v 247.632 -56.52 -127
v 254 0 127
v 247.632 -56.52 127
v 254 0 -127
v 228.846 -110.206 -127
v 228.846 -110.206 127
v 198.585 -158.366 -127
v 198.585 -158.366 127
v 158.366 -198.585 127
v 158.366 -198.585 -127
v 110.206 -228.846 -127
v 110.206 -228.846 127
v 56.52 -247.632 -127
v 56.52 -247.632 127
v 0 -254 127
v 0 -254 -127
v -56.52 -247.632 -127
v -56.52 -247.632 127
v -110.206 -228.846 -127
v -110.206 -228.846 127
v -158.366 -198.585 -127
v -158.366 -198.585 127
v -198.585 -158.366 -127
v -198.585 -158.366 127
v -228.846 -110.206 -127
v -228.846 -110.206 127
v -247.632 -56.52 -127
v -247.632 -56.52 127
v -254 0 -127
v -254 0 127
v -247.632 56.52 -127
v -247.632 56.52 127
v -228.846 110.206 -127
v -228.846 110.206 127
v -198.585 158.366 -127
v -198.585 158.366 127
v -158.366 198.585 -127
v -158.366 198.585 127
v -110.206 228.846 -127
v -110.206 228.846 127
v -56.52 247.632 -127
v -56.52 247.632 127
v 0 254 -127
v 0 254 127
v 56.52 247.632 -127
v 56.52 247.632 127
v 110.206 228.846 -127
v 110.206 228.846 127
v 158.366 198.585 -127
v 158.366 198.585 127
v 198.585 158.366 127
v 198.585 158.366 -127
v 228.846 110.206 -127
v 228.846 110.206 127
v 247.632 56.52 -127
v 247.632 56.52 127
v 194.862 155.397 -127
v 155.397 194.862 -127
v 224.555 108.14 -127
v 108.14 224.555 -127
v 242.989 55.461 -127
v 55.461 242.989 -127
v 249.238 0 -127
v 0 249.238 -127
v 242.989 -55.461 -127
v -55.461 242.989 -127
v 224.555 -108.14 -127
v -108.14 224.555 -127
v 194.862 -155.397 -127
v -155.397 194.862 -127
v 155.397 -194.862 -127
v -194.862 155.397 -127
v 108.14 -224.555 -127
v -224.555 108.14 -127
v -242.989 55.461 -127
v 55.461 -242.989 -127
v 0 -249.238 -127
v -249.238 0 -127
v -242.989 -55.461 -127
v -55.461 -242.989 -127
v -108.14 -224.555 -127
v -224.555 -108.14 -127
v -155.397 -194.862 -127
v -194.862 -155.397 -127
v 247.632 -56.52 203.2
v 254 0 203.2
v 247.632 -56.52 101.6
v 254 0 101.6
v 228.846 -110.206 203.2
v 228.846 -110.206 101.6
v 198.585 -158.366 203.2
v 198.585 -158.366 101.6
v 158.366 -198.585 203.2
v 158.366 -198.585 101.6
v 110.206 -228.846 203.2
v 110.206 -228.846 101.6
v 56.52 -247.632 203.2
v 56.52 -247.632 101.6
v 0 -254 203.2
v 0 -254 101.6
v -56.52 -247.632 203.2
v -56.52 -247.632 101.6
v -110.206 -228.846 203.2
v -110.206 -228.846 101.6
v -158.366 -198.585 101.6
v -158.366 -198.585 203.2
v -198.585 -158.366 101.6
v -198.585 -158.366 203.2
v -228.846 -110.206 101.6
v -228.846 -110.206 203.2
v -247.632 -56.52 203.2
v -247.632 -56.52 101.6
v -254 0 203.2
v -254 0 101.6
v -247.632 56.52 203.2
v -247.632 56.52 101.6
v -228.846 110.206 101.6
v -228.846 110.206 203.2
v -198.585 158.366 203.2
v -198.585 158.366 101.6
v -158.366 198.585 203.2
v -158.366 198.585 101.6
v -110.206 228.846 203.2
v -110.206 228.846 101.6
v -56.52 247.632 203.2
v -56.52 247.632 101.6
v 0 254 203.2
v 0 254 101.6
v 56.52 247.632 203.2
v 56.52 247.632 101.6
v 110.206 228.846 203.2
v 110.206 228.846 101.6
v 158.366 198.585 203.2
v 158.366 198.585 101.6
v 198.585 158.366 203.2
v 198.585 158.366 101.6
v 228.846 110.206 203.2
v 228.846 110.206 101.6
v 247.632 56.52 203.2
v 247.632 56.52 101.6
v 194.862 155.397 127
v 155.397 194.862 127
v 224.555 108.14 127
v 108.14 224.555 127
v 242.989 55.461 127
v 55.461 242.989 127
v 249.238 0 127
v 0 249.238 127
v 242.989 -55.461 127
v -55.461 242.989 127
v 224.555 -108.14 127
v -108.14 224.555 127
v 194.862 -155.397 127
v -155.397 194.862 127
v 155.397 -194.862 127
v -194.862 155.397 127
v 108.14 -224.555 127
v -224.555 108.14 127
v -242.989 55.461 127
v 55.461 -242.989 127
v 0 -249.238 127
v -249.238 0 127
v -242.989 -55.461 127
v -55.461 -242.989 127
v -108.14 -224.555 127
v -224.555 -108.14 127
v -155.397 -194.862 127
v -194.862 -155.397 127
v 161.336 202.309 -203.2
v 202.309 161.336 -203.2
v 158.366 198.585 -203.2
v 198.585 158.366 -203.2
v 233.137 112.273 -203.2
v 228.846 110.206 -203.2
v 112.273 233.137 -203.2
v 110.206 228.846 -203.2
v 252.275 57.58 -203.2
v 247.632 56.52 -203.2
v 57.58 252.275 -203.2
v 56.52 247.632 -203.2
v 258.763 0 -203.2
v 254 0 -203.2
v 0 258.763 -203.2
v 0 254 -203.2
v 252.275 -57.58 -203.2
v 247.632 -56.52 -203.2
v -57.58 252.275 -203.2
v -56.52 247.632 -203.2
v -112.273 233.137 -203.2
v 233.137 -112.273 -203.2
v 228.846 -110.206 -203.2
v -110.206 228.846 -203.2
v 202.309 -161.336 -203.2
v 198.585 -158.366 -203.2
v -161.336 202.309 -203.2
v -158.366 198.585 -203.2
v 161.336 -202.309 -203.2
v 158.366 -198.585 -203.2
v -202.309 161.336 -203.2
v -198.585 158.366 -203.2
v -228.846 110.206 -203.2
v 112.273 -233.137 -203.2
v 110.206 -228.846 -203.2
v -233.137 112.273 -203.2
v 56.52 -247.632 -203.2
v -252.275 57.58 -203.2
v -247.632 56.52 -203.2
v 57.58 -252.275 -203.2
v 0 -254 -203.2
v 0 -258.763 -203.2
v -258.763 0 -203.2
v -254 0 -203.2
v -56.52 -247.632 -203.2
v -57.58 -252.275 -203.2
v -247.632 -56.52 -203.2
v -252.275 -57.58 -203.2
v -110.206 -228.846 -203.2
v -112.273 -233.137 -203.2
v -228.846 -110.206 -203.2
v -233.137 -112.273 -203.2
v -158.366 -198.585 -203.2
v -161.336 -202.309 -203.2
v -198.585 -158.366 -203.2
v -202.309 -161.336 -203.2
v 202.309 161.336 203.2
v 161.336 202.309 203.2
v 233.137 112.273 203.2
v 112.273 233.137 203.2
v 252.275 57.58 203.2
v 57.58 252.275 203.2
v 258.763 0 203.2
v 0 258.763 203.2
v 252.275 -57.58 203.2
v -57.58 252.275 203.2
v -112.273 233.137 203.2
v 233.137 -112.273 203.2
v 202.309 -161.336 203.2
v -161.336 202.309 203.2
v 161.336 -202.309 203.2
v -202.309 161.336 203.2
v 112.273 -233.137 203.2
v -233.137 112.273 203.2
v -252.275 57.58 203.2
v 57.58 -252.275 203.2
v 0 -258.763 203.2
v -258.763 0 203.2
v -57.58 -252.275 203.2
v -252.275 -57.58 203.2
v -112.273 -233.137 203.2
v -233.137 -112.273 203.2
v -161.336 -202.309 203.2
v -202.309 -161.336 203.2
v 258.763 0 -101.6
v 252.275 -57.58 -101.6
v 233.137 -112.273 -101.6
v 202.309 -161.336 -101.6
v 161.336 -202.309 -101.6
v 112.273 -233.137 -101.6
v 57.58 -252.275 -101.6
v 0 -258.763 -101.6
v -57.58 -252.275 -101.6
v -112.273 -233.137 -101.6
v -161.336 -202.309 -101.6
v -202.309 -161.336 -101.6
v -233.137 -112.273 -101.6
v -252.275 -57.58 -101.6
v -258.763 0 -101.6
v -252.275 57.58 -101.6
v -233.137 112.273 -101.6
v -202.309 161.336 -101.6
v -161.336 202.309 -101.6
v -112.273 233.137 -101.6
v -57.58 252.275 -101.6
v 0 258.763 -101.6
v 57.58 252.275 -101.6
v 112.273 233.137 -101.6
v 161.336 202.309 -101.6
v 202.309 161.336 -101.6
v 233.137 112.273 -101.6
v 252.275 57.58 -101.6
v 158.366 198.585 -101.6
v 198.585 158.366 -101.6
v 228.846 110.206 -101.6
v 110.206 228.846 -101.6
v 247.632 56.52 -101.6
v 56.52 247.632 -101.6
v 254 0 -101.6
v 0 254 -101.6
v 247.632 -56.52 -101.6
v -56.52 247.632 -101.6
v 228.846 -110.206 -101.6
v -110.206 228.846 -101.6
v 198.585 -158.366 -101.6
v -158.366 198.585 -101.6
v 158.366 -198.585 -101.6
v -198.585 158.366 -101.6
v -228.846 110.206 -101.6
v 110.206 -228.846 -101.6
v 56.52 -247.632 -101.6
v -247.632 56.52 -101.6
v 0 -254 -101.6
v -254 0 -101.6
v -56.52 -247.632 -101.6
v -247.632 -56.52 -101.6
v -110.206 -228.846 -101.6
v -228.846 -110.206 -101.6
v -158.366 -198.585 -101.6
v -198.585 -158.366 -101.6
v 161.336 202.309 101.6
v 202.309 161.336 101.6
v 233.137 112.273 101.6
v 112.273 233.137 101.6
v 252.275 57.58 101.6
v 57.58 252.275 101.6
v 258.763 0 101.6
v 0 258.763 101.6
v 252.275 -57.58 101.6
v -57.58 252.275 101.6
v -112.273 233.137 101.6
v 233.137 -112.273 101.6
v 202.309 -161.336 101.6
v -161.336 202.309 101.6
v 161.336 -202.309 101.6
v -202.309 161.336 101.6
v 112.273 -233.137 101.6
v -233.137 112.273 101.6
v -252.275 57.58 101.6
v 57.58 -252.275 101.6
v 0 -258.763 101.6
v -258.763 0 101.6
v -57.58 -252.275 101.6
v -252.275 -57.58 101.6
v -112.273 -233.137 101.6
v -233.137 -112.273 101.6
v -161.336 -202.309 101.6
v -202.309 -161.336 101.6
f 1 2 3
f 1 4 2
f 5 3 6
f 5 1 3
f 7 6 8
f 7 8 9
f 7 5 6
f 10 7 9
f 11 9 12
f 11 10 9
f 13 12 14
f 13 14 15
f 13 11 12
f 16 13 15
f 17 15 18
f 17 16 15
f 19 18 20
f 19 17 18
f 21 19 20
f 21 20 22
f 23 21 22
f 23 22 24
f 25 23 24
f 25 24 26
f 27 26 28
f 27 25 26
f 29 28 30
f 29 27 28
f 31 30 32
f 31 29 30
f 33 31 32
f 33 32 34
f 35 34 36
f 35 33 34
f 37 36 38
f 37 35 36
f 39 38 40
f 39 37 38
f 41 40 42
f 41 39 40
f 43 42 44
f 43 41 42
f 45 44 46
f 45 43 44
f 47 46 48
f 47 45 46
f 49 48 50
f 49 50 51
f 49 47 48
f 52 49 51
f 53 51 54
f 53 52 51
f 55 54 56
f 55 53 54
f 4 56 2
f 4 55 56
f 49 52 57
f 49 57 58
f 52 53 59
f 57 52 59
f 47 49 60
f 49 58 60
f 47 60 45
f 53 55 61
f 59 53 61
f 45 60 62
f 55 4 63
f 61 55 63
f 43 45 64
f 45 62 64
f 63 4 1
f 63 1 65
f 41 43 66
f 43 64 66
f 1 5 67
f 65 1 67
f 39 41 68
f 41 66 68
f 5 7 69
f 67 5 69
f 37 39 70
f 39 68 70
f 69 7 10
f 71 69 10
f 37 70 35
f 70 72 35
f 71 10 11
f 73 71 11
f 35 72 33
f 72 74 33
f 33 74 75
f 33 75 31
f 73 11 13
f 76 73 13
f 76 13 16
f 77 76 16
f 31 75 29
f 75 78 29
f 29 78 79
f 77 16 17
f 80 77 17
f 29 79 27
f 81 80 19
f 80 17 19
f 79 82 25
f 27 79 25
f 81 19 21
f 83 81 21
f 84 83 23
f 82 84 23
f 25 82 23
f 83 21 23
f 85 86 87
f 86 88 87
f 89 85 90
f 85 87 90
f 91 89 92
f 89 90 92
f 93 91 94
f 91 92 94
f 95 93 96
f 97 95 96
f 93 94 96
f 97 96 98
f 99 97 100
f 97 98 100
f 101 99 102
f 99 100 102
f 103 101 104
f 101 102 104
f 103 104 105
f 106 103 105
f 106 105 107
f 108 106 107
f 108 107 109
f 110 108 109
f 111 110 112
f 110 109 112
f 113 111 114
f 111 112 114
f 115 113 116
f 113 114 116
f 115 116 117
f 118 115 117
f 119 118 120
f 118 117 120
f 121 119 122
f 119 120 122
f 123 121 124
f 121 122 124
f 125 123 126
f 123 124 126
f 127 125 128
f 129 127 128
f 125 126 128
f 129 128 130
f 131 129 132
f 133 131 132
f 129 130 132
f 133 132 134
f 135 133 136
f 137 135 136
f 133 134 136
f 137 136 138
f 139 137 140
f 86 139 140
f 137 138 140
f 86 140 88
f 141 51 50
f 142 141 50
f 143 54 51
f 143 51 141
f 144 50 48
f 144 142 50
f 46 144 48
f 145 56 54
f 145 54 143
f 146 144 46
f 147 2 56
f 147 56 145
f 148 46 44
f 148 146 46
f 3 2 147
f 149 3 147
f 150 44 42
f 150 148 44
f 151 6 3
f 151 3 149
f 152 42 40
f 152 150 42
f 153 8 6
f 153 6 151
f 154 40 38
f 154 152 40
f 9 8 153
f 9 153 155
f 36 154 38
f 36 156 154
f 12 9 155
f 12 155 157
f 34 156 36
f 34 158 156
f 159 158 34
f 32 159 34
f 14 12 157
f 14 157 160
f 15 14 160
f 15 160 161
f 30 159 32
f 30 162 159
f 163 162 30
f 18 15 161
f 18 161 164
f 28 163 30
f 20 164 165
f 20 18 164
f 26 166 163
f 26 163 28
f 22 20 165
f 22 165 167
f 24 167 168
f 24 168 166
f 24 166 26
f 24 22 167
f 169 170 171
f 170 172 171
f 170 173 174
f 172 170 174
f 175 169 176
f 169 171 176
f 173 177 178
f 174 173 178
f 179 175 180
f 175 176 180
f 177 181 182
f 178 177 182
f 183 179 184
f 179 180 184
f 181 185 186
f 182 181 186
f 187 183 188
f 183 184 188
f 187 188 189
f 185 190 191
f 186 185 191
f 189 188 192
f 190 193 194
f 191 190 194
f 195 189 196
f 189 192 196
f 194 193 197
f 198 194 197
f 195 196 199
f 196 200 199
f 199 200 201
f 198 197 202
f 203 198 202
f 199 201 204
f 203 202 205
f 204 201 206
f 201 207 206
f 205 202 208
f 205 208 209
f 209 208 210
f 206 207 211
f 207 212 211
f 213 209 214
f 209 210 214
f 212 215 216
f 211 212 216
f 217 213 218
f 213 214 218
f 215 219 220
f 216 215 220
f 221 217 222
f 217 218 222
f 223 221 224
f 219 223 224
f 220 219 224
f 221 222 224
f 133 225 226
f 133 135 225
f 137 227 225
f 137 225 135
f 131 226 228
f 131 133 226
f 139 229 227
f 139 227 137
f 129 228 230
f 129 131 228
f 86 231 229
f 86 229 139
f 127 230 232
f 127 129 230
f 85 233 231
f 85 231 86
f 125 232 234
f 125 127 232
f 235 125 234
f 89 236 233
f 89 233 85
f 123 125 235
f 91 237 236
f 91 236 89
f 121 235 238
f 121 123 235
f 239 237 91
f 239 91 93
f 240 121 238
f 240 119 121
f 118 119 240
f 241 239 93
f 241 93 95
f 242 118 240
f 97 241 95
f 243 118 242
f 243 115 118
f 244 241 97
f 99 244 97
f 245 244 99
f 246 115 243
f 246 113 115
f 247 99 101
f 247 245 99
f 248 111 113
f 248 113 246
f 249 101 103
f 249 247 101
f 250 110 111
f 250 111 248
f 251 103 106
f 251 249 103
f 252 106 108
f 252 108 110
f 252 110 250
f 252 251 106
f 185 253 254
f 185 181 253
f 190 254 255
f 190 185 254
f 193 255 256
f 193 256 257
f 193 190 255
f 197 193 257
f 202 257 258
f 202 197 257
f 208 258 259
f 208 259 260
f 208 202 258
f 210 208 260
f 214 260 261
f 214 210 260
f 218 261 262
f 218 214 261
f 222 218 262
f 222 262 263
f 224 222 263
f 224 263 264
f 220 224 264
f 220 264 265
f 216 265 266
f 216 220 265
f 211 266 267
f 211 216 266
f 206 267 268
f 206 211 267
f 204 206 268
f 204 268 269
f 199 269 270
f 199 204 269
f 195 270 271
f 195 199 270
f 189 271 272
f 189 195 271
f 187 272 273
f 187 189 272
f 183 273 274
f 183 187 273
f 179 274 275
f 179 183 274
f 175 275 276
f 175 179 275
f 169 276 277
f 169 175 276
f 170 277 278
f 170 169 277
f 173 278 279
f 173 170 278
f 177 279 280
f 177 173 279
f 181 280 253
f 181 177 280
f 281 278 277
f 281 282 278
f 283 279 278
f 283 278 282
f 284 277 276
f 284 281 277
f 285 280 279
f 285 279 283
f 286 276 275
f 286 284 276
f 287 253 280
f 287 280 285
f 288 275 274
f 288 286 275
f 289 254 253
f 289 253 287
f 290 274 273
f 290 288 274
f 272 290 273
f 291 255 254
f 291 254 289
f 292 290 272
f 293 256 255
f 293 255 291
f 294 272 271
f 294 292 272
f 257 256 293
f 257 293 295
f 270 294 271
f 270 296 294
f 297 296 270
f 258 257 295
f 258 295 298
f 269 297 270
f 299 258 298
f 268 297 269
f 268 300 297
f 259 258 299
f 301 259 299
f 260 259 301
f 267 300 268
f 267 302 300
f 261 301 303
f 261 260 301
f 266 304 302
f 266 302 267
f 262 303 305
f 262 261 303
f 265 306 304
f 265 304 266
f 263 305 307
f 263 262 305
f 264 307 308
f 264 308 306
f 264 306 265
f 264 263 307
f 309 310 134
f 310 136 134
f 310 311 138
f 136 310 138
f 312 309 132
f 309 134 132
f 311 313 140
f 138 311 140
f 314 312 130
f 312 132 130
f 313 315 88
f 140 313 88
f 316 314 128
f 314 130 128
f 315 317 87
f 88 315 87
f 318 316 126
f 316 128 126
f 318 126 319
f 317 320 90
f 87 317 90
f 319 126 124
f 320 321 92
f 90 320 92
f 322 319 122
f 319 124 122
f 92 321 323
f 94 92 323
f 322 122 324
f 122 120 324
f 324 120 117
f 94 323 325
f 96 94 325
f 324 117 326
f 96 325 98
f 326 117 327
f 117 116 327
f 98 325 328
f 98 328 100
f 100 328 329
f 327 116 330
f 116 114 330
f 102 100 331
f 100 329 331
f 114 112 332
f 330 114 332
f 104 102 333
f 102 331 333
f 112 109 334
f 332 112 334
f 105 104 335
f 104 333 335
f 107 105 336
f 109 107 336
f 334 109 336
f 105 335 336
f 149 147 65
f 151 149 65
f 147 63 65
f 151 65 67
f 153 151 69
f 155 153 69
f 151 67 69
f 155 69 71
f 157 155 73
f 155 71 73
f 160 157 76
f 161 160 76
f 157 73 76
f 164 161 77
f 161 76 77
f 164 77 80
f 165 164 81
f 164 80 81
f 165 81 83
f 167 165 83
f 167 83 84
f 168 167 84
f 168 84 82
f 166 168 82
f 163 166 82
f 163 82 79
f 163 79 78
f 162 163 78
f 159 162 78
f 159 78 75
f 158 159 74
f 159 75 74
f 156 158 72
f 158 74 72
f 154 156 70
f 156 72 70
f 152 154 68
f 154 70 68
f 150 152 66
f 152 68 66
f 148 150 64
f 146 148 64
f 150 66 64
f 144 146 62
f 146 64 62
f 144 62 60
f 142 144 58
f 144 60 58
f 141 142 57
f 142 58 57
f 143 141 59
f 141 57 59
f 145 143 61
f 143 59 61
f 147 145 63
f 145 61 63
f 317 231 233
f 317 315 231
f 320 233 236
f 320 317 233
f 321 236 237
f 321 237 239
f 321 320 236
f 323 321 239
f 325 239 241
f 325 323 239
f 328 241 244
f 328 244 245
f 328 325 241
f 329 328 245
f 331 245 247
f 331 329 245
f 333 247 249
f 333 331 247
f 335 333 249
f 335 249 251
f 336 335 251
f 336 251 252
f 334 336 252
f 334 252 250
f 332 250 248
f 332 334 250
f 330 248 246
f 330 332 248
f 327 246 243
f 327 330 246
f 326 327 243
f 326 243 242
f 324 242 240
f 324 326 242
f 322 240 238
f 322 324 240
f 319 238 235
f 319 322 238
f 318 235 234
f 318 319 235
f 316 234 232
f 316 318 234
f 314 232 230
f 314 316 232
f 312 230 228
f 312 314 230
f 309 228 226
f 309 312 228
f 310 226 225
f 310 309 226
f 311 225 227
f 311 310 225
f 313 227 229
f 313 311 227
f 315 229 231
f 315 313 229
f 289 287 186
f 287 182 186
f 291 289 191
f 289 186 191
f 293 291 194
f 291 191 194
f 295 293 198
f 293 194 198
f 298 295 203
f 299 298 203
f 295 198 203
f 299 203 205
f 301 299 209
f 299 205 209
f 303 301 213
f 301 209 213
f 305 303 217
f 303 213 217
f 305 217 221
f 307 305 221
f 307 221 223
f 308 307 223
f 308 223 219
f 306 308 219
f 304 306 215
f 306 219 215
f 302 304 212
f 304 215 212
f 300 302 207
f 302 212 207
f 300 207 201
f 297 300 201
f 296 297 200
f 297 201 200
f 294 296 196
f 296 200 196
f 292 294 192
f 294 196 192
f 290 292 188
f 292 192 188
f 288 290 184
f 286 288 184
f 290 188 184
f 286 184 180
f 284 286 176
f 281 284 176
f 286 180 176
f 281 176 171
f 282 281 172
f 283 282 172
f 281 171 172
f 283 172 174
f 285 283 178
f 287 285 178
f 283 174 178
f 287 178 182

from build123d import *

# Parameters (mm, degrees)
SKETCH2_W = 101.6
SKETCH2_H = 4.7625
SKETCH3_W = 254
SKETCH3_H = 4.7625


with BuildPart() as part:
    # Sketch2 → Revolve1 (revolve)
    with BuildSketch(Plane(origin=(0, 0, 0), x_dir=(0, 0, -1), z_dir=(1, 0, 0)), mode=Mode.PRIVATE) as revolve1_sk:
        with Locations((-152.4, 256.38125)):
            Rectangle(SKETCH2_W, SKETCH2_H)
        with Locations((152.4, 256.38125)):
            Rectangle(SKETCH2_W, SKETCH2_H)
    revolve(revolve1_sk.sketch.rotate(Axis((0, 0, 62.594581749), (0, 0, -1)), 90), axis=Axis((0, 0, 62.594581749), (0, 0, -1)))  # turned: the seam where the file's is


with BuildPart() as body_2:
    # Sketch3 → Revolve2 (revolve)
    with BuildSketch(Plane(origin=(0, 0, 0), x_dir=(0, 0, -1), z_dir=(1, 0, 0)), mode=Mode.PRIVATE) as revolve2_sk:
        with Locations((0, 251.61875)):
            Rectangle(SKETCH3_W, SKETCH3_H)
    revolve(revolve2_sk.sketch.rotate(Axis((0, 0, 0), (0, 0, -1)), 90), axis=Axis((0, 0, 0), (0, 0, -1)))  # turned: the seam where the file's is


solid = Compound([part.part, body_2.part])
